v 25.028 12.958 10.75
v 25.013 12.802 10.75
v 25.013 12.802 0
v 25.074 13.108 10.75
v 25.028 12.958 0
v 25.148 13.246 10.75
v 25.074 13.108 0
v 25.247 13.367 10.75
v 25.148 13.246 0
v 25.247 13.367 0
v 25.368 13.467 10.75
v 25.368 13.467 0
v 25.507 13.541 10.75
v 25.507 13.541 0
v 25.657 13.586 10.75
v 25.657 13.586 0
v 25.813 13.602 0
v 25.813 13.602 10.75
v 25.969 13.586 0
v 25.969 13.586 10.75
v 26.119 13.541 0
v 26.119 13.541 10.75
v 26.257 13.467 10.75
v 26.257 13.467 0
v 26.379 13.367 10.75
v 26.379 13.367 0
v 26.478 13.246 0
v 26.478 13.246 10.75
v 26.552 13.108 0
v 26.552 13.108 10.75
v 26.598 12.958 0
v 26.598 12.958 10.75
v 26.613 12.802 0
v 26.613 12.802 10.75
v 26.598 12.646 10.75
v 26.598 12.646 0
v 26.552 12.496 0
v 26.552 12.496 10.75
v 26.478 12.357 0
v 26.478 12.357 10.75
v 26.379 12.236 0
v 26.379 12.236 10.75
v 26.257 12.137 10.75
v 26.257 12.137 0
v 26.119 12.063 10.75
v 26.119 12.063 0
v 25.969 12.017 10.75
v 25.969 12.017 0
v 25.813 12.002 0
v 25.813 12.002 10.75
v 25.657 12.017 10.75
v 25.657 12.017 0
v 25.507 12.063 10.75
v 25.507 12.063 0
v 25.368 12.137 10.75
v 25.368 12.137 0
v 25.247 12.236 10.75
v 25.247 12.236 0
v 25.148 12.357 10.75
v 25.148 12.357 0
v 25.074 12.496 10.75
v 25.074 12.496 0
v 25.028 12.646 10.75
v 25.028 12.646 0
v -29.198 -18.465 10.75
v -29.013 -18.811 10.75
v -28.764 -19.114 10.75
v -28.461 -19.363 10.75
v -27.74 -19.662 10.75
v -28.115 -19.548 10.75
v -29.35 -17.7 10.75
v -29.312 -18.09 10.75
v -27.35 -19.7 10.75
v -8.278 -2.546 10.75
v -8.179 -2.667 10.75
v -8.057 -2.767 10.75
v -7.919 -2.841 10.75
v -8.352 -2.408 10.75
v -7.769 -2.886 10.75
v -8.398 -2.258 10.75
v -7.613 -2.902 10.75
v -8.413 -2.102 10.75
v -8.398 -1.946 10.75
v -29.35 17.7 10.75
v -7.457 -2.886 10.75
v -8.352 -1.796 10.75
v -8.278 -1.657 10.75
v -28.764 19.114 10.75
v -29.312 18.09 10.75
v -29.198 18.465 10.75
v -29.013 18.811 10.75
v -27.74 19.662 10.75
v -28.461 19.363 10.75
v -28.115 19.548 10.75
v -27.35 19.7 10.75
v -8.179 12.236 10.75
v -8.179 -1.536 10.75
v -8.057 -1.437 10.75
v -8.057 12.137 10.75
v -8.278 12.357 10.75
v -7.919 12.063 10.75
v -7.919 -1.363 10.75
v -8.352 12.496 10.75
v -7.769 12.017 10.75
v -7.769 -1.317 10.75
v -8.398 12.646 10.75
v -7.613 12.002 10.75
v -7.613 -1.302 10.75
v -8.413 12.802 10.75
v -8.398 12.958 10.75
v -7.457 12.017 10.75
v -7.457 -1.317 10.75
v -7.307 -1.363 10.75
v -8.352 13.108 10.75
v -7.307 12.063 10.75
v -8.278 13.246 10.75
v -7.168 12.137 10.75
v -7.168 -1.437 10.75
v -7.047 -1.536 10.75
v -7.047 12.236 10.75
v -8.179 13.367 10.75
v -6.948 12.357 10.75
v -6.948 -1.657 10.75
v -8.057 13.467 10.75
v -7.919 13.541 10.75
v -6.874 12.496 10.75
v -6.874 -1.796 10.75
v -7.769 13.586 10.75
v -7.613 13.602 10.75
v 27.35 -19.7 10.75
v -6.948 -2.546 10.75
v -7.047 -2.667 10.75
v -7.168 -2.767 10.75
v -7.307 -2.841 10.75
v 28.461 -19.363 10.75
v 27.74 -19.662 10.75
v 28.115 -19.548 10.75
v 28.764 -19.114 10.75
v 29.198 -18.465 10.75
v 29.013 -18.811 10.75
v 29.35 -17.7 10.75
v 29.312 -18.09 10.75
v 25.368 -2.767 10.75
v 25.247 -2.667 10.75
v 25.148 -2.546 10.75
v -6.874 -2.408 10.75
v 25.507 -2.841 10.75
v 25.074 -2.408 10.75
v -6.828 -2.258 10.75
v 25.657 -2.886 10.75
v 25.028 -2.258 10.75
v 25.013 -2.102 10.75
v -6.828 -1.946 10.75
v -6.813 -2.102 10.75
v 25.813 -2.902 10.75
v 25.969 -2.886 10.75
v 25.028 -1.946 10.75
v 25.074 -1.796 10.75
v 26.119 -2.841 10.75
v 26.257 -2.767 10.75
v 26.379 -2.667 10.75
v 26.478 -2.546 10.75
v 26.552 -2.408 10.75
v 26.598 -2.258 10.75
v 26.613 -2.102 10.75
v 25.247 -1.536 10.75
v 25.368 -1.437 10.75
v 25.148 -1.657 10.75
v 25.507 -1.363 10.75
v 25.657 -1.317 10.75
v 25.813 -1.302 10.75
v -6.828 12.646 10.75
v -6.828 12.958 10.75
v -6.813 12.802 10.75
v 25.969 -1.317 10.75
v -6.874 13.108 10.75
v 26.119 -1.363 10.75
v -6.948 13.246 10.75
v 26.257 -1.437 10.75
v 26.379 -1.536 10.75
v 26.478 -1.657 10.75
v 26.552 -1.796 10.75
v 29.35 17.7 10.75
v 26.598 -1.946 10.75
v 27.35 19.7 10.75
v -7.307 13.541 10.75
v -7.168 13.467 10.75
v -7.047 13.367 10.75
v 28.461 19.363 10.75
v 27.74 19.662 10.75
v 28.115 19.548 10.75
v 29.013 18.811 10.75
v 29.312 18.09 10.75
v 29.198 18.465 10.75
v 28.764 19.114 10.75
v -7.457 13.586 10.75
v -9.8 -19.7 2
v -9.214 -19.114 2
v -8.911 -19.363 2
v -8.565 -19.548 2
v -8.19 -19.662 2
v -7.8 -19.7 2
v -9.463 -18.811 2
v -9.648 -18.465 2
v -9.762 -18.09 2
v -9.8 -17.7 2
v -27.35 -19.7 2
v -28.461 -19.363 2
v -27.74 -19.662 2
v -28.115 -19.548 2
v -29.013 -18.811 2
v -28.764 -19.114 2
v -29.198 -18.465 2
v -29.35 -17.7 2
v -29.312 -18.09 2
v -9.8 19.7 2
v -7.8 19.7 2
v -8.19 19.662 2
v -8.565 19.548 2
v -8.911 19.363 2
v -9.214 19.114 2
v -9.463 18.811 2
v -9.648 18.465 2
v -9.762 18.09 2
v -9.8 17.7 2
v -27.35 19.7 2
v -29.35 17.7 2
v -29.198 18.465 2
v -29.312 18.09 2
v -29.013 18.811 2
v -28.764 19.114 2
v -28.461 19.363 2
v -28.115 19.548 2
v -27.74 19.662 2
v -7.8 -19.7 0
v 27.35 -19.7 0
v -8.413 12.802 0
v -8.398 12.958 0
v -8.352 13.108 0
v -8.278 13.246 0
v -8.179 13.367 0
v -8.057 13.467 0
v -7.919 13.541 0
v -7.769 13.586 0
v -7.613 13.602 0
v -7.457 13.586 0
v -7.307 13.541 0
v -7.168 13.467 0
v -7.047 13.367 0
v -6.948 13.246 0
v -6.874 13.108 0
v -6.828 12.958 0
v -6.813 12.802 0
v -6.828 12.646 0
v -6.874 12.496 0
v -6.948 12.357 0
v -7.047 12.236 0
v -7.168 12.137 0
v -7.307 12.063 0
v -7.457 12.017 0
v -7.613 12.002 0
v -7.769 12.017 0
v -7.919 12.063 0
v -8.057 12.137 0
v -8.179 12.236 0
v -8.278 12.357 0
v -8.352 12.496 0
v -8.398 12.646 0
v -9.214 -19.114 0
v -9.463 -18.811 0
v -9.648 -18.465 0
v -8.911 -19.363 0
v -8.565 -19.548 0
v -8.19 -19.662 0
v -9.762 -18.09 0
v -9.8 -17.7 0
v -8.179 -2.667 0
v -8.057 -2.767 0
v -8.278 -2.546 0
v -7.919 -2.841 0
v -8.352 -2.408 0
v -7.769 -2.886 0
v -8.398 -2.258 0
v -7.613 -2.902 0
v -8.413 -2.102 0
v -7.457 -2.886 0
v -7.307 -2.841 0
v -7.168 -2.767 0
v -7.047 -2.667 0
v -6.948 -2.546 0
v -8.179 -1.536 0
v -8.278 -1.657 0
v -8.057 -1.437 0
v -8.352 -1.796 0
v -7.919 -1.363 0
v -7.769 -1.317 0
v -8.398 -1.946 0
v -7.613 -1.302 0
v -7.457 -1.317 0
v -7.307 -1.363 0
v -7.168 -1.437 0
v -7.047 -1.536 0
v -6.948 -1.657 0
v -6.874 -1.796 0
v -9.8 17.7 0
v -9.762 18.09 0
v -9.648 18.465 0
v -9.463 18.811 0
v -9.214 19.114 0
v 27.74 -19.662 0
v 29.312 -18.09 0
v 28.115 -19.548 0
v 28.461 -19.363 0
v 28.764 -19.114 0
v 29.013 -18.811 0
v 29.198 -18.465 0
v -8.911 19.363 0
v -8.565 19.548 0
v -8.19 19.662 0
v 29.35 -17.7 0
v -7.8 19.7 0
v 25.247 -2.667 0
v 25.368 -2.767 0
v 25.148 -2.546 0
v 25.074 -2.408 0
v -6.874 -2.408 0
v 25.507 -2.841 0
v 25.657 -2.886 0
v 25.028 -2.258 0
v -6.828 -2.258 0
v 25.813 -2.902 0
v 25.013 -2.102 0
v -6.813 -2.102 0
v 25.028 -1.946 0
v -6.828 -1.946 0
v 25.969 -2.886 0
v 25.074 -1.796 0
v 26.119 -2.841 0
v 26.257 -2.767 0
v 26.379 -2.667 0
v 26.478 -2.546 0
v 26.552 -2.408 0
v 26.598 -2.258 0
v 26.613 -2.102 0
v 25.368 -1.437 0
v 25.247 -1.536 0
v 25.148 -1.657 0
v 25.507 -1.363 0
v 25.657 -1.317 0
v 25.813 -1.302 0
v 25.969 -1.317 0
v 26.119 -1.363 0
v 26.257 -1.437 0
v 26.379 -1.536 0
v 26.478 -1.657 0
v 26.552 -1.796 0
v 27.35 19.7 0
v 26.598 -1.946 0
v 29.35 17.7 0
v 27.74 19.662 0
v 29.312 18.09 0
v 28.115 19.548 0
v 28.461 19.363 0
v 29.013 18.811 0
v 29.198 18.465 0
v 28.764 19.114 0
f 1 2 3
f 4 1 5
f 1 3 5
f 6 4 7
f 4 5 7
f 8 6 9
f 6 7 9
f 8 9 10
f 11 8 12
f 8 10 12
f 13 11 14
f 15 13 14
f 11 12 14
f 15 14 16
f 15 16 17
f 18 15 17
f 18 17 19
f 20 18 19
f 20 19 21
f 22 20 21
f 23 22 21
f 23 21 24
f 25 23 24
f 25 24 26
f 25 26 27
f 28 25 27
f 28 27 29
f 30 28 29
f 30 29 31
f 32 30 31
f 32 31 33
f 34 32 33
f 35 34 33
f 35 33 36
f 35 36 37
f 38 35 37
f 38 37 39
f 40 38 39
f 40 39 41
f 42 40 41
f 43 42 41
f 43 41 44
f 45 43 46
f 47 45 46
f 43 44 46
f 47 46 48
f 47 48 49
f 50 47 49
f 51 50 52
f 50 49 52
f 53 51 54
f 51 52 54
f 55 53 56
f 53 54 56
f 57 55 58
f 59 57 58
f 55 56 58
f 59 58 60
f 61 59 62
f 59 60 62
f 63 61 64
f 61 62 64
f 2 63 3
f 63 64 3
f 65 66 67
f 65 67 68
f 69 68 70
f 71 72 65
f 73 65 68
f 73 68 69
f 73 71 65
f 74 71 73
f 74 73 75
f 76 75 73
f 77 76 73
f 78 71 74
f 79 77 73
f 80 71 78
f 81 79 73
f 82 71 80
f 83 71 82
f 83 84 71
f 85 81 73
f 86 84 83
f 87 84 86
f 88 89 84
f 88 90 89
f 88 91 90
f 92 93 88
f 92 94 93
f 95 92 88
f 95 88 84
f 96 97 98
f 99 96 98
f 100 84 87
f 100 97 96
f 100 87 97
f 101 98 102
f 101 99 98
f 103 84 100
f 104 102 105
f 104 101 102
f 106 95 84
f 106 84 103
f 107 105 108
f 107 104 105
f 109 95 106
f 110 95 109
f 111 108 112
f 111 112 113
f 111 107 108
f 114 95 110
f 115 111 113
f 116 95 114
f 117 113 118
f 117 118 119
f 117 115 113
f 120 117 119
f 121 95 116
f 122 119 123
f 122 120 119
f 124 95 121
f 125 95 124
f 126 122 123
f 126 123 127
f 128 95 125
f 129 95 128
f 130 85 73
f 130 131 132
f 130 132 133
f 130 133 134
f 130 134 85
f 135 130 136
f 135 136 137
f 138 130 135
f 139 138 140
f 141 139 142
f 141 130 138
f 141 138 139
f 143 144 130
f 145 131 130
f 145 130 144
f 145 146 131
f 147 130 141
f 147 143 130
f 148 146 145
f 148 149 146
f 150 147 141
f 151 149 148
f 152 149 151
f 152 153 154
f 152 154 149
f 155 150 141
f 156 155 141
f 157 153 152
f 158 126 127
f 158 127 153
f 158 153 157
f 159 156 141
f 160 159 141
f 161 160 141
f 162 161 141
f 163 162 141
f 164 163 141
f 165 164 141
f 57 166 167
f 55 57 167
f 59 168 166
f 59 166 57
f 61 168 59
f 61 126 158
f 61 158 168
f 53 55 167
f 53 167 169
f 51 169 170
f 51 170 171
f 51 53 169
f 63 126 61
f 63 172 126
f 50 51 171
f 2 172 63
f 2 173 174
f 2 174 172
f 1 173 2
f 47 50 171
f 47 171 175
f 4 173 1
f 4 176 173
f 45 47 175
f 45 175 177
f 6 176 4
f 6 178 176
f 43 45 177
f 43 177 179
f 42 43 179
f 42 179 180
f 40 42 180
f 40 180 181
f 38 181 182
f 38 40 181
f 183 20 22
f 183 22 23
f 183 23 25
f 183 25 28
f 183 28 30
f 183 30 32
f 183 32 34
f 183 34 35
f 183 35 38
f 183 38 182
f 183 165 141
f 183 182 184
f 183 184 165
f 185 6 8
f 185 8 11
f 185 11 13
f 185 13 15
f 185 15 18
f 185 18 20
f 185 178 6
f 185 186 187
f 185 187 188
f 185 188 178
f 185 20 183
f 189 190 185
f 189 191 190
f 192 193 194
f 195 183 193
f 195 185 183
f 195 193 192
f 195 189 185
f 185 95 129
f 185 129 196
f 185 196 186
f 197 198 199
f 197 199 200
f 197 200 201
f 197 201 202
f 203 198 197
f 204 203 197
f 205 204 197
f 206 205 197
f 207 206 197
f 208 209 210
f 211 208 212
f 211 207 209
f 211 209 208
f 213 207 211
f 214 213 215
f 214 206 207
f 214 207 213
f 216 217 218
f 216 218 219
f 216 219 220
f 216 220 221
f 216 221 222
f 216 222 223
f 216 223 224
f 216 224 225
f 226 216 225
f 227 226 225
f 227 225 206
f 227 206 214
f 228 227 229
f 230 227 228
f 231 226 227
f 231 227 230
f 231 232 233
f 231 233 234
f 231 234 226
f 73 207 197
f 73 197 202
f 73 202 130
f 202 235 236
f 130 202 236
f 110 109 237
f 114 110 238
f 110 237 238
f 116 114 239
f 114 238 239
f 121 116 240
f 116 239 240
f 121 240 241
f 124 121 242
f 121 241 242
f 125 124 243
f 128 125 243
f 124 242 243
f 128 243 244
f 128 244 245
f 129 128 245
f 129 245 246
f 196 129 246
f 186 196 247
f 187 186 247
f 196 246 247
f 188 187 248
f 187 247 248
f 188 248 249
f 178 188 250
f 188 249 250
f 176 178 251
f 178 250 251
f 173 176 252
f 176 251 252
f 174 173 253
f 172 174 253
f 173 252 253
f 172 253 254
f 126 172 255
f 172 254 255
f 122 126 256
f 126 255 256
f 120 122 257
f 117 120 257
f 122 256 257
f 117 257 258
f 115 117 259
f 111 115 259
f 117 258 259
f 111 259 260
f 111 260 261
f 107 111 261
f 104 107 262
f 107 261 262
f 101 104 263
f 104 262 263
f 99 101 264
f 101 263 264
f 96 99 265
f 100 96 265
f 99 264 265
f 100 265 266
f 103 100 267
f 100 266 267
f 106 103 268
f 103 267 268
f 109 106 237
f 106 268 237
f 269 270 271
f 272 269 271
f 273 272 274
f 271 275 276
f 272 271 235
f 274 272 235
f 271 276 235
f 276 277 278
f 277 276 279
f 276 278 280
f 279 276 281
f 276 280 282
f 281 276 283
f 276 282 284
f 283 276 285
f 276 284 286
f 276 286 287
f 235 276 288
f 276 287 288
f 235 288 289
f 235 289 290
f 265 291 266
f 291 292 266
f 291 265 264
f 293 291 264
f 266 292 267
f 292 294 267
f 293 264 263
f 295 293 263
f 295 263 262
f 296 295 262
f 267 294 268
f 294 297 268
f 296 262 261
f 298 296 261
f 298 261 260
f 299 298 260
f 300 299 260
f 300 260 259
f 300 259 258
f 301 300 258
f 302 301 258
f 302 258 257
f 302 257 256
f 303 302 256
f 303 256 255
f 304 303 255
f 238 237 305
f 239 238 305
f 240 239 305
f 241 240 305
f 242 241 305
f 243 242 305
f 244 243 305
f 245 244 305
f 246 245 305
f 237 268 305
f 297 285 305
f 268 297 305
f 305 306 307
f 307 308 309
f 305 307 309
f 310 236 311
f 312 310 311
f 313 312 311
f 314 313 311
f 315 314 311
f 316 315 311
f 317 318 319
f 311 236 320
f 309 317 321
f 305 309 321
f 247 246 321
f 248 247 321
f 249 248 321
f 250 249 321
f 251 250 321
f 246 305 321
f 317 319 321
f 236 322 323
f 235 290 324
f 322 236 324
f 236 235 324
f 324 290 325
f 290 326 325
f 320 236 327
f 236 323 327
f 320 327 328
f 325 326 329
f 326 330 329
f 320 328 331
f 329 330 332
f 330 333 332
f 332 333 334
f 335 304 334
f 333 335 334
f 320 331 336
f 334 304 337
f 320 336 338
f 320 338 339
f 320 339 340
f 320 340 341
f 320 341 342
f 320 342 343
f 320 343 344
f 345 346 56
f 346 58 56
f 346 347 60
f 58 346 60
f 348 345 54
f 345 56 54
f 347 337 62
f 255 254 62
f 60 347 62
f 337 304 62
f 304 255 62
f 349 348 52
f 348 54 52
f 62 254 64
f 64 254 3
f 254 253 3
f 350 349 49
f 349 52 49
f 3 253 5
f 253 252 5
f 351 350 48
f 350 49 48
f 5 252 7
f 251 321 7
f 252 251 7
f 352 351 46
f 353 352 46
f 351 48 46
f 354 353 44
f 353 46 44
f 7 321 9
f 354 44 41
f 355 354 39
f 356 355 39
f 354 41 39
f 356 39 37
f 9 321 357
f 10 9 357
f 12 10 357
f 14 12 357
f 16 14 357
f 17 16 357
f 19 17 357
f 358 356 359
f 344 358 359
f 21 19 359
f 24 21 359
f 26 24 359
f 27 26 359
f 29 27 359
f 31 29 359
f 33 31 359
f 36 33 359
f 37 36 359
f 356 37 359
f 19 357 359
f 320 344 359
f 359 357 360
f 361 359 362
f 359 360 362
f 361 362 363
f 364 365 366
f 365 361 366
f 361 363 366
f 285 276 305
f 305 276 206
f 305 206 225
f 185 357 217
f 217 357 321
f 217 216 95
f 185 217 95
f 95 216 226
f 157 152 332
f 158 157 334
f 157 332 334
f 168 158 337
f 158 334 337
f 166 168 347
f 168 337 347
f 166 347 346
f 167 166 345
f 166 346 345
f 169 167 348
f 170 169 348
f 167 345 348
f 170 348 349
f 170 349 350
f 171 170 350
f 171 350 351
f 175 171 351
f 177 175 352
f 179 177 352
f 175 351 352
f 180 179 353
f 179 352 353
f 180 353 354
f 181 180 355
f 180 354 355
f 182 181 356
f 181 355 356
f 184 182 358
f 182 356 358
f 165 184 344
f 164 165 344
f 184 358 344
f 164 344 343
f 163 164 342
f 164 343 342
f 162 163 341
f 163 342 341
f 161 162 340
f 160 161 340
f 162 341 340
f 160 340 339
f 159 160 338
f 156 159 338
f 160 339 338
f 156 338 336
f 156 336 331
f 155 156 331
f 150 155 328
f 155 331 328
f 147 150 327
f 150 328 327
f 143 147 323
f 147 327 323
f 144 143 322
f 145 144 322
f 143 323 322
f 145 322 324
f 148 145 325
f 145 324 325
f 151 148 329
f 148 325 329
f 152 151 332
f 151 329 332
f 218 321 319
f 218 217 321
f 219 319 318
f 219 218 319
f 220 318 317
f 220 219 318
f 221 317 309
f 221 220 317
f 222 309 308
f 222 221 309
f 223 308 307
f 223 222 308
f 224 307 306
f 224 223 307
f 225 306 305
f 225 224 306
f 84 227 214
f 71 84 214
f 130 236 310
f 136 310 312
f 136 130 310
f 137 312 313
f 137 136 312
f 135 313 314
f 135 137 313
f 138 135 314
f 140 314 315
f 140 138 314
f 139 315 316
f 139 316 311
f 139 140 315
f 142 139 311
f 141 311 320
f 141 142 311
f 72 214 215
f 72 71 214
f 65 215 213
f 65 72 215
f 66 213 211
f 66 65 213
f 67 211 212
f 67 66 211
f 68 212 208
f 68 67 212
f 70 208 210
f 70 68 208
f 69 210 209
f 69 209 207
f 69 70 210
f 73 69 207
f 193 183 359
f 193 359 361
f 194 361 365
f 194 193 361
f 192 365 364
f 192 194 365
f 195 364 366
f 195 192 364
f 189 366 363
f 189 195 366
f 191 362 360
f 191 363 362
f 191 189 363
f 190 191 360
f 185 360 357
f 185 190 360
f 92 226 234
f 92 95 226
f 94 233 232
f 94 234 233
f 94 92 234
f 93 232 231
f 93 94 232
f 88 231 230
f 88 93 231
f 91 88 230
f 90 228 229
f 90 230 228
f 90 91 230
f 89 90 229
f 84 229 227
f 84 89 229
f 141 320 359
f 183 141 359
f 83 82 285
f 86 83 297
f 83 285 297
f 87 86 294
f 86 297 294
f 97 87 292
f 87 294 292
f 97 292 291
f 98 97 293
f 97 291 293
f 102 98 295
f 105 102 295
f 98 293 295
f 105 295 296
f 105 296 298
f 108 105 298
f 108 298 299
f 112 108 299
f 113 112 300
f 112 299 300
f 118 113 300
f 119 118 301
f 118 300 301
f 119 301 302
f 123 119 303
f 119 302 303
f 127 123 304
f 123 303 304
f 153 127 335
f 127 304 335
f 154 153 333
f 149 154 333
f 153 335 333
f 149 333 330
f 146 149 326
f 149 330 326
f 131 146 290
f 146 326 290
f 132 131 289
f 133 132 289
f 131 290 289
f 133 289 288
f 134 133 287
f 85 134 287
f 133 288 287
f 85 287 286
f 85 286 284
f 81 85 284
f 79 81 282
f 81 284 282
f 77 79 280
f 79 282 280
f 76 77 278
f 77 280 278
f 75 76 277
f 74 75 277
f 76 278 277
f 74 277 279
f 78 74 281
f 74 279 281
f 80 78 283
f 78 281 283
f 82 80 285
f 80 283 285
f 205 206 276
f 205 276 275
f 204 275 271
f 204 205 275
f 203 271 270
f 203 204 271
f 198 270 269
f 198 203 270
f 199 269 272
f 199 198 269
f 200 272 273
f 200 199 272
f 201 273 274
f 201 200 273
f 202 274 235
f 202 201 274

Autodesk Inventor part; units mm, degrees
ref_plane "YZ Plane" through (0, 0, 0) normal (1, 0, 0) x (0, 1, 0)
ref_plane "XZ Plane" through (0, 0, 0) normal (0, 1, 0) x (-1, 0, 0)
ref_plane "XY Plane" through (0, 0, 0) normal (0, 0, 1) x (1, 0, 0)
sketch "Sketch1" plane through (0, 0, 0) normal (0, 0, 1) x (1, 0, 0)
  line L0 (-29.35, -19.7) -> (29.35, -19.7)
  line L1 (29.35, -19.7) -> (29.35, 19.7)
  line L2 (29.35, 19.7) -> (-29.35, 19.7)
  line L3 (-29.35, 19.7) -> (-29.35, -19.7)
  line L4 (-29.35, -19.7) -> (29.35, 19.7) construction
  line L5 (29.35, -19.7) -> (-29.35, 19.7) construction
  point P0 (0, 0)
  dimension "d0" = 39.4
  dimension "d1" = 58.7
extrude "Extrusion1" add sketch "Sketch1" along normal blind 10.75
sketch "Sketch2" plane through (0, 0, 0) normal (0, 0, -1) x (-1, 0, 0)
  circle A0 centre (7.6129, -2.1018) radius 1.5 construction
  circle A1 centre (-25.8129, -2.1018) radius 1.5 construction
  circle A2 centre (-25.8129, 12.8018) radius 1.5 construction
  circle A3 centre (7.6129, 12.8018) radius 1.5 construction
  circle A4 centre (7.6129, -2.1018) radius 0.8
  circle A5 centre (-25.8129, -2.1018) radius 0.8
  circle A6 centre (-25.8129, 12.8018) radius 0.8
  circle A7 centre (7.6129, 12.8018) radius 0.8
  point P0 (0, 0)
  dimension "d4" = 1.6
  dimension "d5" = 1.6
  dimension "d6" = 1.6
  dimension "d7" = 1.6
extrude "Extrusion2" cut sketch "Sketch2" against normal through all
sketch "Sketch5" plane through (0, 0, 0) normal (0, 0, -1) x (-1, 0, 0)
  line L0 (-29.35, 19.7) -> (29.35, 19.7) projected
  line L1 (29.35, -19.7) -> (9.8, -19.7)
  line L2 (9.8, -19.7) -> (9.8, 19.7)
  line L3 (9.8, 19.7) -> (29.35, 19.7)
  line L4 (29.35, 19.7) -> (29.35, -19.7)
  point P0 (0, 0)
  dimension "d10" = 19.55
extrude "Extrusion3" cut sketch "Sketch5" against normal blind 2
fillet "Fillet1" radius 2 4 edges at (-29.35, -19.7, 6.375) (-29.35, 19.7, 6.375) (29.35, 19.7, 5.375) (29.35, -19.7, 5.375)
fillet "Fillet2" radius 2 2 edges at (-9.8, 19.7, 1) (-9.8, -19.7, 1)
equation "\"d5\" = d4"
equation "\"d6\" = d4"
equation "\"d7\" = d4"
properties part number "ThermalConductivityBlock"
